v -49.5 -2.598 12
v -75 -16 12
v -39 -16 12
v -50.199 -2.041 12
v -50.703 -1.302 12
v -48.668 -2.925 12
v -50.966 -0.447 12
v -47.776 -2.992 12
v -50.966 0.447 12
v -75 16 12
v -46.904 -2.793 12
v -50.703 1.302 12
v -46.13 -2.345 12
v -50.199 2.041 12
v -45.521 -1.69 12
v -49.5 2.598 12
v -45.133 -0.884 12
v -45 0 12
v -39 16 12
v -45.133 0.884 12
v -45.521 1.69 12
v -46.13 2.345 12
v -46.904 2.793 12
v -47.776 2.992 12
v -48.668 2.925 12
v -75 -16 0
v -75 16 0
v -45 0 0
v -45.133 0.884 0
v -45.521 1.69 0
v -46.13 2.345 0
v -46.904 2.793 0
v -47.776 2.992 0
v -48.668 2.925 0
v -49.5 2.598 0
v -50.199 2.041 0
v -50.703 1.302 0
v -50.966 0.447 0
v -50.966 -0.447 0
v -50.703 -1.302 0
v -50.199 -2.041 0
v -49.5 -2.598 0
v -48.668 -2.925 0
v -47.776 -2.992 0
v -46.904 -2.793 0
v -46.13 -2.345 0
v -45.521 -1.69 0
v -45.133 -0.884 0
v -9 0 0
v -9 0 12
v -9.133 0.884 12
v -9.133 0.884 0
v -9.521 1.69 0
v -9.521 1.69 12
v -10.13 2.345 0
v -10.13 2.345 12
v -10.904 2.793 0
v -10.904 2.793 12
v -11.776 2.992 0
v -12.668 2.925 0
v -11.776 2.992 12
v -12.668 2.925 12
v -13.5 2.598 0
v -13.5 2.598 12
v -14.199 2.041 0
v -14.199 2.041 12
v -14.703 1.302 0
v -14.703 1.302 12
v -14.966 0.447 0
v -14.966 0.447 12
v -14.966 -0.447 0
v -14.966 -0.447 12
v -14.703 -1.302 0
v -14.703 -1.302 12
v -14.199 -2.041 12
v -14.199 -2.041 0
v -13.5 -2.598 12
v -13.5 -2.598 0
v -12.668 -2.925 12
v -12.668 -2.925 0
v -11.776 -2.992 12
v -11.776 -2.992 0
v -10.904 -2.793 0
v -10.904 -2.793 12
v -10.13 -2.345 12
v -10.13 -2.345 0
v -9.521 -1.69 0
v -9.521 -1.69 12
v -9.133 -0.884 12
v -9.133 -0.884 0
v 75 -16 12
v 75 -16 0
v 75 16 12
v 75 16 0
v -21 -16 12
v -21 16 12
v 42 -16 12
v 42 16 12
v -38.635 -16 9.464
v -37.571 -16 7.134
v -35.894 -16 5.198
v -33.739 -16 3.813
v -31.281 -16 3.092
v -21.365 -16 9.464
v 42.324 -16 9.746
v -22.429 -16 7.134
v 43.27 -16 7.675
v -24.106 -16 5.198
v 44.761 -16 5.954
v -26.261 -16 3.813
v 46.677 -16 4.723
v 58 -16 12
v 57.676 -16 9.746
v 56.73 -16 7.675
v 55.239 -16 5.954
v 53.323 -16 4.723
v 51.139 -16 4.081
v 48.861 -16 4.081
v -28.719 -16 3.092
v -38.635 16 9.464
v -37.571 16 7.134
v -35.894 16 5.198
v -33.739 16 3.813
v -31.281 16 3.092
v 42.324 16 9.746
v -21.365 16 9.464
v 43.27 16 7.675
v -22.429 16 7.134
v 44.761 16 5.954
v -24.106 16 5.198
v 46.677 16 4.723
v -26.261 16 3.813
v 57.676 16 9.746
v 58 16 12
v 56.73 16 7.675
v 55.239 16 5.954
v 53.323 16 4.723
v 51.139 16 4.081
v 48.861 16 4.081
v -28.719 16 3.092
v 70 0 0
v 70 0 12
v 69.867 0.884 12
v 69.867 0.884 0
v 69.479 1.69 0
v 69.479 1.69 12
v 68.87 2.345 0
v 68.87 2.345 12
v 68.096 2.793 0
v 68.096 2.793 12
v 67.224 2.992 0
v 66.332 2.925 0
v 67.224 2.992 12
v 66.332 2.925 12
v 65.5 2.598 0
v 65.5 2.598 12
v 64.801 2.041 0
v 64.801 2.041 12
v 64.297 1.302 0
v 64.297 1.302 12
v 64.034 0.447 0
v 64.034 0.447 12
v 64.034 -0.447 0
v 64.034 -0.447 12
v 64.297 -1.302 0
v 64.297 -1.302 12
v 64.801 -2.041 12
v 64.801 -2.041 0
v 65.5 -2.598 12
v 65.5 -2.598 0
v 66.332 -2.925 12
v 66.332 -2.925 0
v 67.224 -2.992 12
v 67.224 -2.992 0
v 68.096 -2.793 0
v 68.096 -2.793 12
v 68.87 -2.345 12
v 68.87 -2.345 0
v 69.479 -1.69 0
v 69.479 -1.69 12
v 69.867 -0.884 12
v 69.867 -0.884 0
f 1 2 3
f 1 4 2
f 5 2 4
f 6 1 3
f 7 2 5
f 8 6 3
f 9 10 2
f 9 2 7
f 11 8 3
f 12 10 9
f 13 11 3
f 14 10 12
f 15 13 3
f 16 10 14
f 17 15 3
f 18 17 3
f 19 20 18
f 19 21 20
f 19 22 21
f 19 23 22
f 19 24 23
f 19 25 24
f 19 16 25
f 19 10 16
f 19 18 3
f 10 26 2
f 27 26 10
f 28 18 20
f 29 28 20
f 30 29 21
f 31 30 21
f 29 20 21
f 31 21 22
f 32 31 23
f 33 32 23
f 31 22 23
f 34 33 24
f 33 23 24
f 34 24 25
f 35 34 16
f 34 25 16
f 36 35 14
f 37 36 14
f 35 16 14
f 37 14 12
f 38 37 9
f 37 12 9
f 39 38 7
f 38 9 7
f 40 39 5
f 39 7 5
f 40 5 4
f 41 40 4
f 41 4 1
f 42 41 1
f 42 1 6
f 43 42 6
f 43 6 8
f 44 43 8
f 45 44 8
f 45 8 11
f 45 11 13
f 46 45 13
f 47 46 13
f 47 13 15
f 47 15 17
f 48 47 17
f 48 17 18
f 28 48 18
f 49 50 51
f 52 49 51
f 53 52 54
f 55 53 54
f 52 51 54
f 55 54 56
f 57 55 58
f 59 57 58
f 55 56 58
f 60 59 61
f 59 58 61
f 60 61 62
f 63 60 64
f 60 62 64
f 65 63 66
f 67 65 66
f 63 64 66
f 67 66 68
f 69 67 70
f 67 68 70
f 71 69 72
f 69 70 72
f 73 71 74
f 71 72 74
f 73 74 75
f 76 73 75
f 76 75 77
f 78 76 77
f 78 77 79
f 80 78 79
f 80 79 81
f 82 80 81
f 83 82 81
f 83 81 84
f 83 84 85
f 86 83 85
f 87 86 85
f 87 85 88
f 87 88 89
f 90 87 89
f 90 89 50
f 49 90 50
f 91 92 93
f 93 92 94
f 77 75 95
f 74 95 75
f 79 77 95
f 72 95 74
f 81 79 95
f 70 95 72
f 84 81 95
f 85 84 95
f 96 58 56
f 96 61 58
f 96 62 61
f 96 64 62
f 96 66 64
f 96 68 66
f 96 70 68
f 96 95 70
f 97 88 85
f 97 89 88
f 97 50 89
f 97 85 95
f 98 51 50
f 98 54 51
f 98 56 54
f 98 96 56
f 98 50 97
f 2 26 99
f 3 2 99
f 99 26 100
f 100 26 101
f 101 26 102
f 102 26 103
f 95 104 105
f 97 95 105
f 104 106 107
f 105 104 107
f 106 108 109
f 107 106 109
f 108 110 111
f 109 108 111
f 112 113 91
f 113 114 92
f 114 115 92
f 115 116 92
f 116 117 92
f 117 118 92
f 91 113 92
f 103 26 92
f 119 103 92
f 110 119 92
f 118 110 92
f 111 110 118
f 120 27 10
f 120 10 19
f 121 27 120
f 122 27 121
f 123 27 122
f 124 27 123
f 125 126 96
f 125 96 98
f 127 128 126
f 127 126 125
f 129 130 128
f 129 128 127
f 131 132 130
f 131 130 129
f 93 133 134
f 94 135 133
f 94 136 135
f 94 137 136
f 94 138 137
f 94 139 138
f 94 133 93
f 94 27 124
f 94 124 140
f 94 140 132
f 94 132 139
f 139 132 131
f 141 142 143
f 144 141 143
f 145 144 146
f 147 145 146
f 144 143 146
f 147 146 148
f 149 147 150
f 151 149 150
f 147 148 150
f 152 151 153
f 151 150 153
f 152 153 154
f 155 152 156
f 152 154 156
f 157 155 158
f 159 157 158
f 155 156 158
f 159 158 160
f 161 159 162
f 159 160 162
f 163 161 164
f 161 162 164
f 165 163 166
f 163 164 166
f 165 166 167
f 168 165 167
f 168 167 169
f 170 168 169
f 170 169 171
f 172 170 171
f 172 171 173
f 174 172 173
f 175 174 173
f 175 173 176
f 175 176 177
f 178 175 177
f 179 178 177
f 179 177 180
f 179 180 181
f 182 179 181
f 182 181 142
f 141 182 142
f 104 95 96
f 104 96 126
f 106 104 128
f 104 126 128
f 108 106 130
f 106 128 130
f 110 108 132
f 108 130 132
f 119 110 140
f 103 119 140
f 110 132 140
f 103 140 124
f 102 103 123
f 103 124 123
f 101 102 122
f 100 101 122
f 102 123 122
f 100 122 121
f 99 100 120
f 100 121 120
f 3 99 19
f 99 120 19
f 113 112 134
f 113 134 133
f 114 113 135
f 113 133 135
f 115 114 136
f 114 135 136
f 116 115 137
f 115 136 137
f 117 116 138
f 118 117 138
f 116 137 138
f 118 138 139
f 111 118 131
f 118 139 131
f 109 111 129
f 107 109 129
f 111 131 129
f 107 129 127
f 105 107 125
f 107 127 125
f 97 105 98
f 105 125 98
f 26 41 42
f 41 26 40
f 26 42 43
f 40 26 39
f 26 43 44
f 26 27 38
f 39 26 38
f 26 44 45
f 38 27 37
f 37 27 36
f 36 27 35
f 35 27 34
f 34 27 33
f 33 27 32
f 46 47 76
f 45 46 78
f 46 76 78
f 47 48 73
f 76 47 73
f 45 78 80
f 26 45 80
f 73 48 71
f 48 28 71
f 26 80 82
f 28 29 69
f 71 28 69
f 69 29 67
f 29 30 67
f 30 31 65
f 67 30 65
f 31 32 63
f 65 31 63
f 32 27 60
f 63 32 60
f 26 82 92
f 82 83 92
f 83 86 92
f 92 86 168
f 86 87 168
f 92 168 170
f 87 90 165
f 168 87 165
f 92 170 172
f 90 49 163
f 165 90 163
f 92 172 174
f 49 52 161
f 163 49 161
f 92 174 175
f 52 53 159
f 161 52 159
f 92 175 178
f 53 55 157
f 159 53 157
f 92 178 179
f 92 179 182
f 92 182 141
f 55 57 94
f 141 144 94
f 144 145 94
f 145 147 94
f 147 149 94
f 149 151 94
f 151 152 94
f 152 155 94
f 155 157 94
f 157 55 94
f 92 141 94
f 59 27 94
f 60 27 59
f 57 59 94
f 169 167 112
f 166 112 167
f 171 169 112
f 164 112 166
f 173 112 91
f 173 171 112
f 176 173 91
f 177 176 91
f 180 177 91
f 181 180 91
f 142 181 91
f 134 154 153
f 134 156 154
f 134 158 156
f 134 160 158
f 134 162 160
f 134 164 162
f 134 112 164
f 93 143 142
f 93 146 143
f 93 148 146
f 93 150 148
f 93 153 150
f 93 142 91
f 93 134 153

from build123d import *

# Parameters (mm, degrees)
IZIM1_W                     = 150
IZIM1_H                     = 32
Y_KSEKLIK_EKSTR_ZYON1_DEPTH = 12
IZIM2_R                     = 8
IZIM2_R_2                   = 9
KES_EKSTR_ZYON1_DEPTH       = 60
IZIM3_R                     = 3
KES_EKSTR_ZYON2_DEPTH       = 30


with BuildPart() as part:
    # Çizim1 → Yükseklik-Ekstrüzyon1 (new body)
    with BuildSketch(Plane.XY):
        Rectangle(IZIM1_W, IZIM1_H)
    extrude(amount=Y_KSEKLIK_EKSTR_ZYON1_DEPTH)

    # Çizim2 → Kes-Ekstrüzyon1 (cut)
    with BuildSketch(Plane(origin=(0, 16, 0), x_dir=(1, 0, 0), z_dir=(0, 1, 0))):
        with Locations((50, -12)):
            Circle(IZIM2_R)
        with Locations((-30, -12)):
            Circle(IZIM2_R_2)
    extrude(amount=-KES_EKSTR_ZYON1_DEPTH, mode=Mode.SUBTRACT)

    # Çizim3 → Kes-Ekstrüzyon2 (cut)
    with BuildSketch(Plane.XY.offset(12)):
        with Locations((67, 0)):
            Circle(IZIM3_R)
        with Locations((-48, 0)):
            Circle(IZIM3_R)
        with Locations((-12, 0)):
            Circle(IZIM3_R)
    extrude(amount=-KES_EKSTR_ZYON2_DEPTH, mode=Mode.SUBTRACT)


solid = part.part
